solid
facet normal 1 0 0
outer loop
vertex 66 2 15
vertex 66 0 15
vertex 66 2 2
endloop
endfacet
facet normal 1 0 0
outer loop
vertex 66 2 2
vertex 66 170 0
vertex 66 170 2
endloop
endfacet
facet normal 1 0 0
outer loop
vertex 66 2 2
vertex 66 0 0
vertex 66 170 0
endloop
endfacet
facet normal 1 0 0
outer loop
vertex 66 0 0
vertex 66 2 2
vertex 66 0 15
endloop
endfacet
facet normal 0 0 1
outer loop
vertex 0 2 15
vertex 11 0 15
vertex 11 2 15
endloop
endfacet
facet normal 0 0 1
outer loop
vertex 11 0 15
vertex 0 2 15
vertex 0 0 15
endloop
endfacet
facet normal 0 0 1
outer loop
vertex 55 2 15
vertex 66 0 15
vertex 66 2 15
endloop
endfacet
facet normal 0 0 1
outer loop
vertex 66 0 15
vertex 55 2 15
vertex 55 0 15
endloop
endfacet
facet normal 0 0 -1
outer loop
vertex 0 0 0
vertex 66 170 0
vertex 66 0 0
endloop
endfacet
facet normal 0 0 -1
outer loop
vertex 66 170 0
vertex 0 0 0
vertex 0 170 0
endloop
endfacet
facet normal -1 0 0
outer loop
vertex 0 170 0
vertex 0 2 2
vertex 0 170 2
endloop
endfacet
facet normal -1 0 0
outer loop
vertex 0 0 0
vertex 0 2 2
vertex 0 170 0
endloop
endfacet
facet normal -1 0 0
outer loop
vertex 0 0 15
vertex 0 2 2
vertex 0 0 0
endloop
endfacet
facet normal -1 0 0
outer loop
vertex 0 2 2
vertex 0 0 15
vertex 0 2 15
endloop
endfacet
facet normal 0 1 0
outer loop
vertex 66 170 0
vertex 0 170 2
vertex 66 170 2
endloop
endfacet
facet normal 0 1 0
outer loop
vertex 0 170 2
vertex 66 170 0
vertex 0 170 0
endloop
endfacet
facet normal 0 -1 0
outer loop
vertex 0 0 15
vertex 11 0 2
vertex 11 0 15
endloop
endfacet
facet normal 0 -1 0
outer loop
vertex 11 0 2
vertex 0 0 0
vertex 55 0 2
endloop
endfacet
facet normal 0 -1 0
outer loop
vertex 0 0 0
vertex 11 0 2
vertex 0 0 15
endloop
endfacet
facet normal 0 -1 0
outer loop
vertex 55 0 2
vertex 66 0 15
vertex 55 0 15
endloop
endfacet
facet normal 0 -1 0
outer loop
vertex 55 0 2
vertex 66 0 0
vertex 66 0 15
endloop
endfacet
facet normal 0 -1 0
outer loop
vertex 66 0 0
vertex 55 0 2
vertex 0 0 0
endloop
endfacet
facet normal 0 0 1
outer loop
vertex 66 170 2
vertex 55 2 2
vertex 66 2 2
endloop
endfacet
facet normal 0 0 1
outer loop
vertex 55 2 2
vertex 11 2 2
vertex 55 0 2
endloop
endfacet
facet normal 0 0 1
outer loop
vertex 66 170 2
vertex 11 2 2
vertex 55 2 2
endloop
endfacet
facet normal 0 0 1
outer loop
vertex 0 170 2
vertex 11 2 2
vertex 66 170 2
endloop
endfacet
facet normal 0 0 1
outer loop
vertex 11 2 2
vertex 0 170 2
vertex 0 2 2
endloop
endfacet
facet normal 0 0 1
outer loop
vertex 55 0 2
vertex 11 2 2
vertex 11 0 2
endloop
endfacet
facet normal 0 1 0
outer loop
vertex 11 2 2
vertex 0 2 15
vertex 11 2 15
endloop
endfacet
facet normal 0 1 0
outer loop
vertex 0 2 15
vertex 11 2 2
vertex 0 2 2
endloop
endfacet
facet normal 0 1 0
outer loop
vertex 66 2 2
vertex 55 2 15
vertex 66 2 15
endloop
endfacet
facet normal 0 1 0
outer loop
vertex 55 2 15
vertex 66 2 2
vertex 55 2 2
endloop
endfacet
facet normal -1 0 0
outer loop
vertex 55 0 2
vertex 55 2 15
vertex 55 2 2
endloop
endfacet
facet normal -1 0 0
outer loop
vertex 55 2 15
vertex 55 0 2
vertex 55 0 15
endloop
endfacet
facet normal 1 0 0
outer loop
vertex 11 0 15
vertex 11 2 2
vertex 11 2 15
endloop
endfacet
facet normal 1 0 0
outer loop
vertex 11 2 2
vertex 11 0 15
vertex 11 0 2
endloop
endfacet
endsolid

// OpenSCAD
$fn=50;

screwDistance=56;
holderX=screwDistance+5+5;
holderY=120+50; /* size of rpi display case */
holderZ=15;
mountThickness=2;
screwPrinterGap=8; /* distance of screw to front plate of the mpsm printer */
screwPrintergapExtra=5;
screwR=2;
extruderX=44;

module rpi_holder()
{
  difference()
  {
    cube([holderX,holderY,holderZ]);
    translate([0,mountThickness,holderZ-screwPrinterGap-screwPrintergapExtra])
      cube([holderX,holderY-mountThickness,screwPrinterGap+screwPrintergapExtra]);

    translate([(holderX-extruderX)/2,0,mountThickness])
      #cube([extruderX,mountThickness,screwPrinterGap+screwPrintergapExtra]);
  }
}

rpi_holder();
